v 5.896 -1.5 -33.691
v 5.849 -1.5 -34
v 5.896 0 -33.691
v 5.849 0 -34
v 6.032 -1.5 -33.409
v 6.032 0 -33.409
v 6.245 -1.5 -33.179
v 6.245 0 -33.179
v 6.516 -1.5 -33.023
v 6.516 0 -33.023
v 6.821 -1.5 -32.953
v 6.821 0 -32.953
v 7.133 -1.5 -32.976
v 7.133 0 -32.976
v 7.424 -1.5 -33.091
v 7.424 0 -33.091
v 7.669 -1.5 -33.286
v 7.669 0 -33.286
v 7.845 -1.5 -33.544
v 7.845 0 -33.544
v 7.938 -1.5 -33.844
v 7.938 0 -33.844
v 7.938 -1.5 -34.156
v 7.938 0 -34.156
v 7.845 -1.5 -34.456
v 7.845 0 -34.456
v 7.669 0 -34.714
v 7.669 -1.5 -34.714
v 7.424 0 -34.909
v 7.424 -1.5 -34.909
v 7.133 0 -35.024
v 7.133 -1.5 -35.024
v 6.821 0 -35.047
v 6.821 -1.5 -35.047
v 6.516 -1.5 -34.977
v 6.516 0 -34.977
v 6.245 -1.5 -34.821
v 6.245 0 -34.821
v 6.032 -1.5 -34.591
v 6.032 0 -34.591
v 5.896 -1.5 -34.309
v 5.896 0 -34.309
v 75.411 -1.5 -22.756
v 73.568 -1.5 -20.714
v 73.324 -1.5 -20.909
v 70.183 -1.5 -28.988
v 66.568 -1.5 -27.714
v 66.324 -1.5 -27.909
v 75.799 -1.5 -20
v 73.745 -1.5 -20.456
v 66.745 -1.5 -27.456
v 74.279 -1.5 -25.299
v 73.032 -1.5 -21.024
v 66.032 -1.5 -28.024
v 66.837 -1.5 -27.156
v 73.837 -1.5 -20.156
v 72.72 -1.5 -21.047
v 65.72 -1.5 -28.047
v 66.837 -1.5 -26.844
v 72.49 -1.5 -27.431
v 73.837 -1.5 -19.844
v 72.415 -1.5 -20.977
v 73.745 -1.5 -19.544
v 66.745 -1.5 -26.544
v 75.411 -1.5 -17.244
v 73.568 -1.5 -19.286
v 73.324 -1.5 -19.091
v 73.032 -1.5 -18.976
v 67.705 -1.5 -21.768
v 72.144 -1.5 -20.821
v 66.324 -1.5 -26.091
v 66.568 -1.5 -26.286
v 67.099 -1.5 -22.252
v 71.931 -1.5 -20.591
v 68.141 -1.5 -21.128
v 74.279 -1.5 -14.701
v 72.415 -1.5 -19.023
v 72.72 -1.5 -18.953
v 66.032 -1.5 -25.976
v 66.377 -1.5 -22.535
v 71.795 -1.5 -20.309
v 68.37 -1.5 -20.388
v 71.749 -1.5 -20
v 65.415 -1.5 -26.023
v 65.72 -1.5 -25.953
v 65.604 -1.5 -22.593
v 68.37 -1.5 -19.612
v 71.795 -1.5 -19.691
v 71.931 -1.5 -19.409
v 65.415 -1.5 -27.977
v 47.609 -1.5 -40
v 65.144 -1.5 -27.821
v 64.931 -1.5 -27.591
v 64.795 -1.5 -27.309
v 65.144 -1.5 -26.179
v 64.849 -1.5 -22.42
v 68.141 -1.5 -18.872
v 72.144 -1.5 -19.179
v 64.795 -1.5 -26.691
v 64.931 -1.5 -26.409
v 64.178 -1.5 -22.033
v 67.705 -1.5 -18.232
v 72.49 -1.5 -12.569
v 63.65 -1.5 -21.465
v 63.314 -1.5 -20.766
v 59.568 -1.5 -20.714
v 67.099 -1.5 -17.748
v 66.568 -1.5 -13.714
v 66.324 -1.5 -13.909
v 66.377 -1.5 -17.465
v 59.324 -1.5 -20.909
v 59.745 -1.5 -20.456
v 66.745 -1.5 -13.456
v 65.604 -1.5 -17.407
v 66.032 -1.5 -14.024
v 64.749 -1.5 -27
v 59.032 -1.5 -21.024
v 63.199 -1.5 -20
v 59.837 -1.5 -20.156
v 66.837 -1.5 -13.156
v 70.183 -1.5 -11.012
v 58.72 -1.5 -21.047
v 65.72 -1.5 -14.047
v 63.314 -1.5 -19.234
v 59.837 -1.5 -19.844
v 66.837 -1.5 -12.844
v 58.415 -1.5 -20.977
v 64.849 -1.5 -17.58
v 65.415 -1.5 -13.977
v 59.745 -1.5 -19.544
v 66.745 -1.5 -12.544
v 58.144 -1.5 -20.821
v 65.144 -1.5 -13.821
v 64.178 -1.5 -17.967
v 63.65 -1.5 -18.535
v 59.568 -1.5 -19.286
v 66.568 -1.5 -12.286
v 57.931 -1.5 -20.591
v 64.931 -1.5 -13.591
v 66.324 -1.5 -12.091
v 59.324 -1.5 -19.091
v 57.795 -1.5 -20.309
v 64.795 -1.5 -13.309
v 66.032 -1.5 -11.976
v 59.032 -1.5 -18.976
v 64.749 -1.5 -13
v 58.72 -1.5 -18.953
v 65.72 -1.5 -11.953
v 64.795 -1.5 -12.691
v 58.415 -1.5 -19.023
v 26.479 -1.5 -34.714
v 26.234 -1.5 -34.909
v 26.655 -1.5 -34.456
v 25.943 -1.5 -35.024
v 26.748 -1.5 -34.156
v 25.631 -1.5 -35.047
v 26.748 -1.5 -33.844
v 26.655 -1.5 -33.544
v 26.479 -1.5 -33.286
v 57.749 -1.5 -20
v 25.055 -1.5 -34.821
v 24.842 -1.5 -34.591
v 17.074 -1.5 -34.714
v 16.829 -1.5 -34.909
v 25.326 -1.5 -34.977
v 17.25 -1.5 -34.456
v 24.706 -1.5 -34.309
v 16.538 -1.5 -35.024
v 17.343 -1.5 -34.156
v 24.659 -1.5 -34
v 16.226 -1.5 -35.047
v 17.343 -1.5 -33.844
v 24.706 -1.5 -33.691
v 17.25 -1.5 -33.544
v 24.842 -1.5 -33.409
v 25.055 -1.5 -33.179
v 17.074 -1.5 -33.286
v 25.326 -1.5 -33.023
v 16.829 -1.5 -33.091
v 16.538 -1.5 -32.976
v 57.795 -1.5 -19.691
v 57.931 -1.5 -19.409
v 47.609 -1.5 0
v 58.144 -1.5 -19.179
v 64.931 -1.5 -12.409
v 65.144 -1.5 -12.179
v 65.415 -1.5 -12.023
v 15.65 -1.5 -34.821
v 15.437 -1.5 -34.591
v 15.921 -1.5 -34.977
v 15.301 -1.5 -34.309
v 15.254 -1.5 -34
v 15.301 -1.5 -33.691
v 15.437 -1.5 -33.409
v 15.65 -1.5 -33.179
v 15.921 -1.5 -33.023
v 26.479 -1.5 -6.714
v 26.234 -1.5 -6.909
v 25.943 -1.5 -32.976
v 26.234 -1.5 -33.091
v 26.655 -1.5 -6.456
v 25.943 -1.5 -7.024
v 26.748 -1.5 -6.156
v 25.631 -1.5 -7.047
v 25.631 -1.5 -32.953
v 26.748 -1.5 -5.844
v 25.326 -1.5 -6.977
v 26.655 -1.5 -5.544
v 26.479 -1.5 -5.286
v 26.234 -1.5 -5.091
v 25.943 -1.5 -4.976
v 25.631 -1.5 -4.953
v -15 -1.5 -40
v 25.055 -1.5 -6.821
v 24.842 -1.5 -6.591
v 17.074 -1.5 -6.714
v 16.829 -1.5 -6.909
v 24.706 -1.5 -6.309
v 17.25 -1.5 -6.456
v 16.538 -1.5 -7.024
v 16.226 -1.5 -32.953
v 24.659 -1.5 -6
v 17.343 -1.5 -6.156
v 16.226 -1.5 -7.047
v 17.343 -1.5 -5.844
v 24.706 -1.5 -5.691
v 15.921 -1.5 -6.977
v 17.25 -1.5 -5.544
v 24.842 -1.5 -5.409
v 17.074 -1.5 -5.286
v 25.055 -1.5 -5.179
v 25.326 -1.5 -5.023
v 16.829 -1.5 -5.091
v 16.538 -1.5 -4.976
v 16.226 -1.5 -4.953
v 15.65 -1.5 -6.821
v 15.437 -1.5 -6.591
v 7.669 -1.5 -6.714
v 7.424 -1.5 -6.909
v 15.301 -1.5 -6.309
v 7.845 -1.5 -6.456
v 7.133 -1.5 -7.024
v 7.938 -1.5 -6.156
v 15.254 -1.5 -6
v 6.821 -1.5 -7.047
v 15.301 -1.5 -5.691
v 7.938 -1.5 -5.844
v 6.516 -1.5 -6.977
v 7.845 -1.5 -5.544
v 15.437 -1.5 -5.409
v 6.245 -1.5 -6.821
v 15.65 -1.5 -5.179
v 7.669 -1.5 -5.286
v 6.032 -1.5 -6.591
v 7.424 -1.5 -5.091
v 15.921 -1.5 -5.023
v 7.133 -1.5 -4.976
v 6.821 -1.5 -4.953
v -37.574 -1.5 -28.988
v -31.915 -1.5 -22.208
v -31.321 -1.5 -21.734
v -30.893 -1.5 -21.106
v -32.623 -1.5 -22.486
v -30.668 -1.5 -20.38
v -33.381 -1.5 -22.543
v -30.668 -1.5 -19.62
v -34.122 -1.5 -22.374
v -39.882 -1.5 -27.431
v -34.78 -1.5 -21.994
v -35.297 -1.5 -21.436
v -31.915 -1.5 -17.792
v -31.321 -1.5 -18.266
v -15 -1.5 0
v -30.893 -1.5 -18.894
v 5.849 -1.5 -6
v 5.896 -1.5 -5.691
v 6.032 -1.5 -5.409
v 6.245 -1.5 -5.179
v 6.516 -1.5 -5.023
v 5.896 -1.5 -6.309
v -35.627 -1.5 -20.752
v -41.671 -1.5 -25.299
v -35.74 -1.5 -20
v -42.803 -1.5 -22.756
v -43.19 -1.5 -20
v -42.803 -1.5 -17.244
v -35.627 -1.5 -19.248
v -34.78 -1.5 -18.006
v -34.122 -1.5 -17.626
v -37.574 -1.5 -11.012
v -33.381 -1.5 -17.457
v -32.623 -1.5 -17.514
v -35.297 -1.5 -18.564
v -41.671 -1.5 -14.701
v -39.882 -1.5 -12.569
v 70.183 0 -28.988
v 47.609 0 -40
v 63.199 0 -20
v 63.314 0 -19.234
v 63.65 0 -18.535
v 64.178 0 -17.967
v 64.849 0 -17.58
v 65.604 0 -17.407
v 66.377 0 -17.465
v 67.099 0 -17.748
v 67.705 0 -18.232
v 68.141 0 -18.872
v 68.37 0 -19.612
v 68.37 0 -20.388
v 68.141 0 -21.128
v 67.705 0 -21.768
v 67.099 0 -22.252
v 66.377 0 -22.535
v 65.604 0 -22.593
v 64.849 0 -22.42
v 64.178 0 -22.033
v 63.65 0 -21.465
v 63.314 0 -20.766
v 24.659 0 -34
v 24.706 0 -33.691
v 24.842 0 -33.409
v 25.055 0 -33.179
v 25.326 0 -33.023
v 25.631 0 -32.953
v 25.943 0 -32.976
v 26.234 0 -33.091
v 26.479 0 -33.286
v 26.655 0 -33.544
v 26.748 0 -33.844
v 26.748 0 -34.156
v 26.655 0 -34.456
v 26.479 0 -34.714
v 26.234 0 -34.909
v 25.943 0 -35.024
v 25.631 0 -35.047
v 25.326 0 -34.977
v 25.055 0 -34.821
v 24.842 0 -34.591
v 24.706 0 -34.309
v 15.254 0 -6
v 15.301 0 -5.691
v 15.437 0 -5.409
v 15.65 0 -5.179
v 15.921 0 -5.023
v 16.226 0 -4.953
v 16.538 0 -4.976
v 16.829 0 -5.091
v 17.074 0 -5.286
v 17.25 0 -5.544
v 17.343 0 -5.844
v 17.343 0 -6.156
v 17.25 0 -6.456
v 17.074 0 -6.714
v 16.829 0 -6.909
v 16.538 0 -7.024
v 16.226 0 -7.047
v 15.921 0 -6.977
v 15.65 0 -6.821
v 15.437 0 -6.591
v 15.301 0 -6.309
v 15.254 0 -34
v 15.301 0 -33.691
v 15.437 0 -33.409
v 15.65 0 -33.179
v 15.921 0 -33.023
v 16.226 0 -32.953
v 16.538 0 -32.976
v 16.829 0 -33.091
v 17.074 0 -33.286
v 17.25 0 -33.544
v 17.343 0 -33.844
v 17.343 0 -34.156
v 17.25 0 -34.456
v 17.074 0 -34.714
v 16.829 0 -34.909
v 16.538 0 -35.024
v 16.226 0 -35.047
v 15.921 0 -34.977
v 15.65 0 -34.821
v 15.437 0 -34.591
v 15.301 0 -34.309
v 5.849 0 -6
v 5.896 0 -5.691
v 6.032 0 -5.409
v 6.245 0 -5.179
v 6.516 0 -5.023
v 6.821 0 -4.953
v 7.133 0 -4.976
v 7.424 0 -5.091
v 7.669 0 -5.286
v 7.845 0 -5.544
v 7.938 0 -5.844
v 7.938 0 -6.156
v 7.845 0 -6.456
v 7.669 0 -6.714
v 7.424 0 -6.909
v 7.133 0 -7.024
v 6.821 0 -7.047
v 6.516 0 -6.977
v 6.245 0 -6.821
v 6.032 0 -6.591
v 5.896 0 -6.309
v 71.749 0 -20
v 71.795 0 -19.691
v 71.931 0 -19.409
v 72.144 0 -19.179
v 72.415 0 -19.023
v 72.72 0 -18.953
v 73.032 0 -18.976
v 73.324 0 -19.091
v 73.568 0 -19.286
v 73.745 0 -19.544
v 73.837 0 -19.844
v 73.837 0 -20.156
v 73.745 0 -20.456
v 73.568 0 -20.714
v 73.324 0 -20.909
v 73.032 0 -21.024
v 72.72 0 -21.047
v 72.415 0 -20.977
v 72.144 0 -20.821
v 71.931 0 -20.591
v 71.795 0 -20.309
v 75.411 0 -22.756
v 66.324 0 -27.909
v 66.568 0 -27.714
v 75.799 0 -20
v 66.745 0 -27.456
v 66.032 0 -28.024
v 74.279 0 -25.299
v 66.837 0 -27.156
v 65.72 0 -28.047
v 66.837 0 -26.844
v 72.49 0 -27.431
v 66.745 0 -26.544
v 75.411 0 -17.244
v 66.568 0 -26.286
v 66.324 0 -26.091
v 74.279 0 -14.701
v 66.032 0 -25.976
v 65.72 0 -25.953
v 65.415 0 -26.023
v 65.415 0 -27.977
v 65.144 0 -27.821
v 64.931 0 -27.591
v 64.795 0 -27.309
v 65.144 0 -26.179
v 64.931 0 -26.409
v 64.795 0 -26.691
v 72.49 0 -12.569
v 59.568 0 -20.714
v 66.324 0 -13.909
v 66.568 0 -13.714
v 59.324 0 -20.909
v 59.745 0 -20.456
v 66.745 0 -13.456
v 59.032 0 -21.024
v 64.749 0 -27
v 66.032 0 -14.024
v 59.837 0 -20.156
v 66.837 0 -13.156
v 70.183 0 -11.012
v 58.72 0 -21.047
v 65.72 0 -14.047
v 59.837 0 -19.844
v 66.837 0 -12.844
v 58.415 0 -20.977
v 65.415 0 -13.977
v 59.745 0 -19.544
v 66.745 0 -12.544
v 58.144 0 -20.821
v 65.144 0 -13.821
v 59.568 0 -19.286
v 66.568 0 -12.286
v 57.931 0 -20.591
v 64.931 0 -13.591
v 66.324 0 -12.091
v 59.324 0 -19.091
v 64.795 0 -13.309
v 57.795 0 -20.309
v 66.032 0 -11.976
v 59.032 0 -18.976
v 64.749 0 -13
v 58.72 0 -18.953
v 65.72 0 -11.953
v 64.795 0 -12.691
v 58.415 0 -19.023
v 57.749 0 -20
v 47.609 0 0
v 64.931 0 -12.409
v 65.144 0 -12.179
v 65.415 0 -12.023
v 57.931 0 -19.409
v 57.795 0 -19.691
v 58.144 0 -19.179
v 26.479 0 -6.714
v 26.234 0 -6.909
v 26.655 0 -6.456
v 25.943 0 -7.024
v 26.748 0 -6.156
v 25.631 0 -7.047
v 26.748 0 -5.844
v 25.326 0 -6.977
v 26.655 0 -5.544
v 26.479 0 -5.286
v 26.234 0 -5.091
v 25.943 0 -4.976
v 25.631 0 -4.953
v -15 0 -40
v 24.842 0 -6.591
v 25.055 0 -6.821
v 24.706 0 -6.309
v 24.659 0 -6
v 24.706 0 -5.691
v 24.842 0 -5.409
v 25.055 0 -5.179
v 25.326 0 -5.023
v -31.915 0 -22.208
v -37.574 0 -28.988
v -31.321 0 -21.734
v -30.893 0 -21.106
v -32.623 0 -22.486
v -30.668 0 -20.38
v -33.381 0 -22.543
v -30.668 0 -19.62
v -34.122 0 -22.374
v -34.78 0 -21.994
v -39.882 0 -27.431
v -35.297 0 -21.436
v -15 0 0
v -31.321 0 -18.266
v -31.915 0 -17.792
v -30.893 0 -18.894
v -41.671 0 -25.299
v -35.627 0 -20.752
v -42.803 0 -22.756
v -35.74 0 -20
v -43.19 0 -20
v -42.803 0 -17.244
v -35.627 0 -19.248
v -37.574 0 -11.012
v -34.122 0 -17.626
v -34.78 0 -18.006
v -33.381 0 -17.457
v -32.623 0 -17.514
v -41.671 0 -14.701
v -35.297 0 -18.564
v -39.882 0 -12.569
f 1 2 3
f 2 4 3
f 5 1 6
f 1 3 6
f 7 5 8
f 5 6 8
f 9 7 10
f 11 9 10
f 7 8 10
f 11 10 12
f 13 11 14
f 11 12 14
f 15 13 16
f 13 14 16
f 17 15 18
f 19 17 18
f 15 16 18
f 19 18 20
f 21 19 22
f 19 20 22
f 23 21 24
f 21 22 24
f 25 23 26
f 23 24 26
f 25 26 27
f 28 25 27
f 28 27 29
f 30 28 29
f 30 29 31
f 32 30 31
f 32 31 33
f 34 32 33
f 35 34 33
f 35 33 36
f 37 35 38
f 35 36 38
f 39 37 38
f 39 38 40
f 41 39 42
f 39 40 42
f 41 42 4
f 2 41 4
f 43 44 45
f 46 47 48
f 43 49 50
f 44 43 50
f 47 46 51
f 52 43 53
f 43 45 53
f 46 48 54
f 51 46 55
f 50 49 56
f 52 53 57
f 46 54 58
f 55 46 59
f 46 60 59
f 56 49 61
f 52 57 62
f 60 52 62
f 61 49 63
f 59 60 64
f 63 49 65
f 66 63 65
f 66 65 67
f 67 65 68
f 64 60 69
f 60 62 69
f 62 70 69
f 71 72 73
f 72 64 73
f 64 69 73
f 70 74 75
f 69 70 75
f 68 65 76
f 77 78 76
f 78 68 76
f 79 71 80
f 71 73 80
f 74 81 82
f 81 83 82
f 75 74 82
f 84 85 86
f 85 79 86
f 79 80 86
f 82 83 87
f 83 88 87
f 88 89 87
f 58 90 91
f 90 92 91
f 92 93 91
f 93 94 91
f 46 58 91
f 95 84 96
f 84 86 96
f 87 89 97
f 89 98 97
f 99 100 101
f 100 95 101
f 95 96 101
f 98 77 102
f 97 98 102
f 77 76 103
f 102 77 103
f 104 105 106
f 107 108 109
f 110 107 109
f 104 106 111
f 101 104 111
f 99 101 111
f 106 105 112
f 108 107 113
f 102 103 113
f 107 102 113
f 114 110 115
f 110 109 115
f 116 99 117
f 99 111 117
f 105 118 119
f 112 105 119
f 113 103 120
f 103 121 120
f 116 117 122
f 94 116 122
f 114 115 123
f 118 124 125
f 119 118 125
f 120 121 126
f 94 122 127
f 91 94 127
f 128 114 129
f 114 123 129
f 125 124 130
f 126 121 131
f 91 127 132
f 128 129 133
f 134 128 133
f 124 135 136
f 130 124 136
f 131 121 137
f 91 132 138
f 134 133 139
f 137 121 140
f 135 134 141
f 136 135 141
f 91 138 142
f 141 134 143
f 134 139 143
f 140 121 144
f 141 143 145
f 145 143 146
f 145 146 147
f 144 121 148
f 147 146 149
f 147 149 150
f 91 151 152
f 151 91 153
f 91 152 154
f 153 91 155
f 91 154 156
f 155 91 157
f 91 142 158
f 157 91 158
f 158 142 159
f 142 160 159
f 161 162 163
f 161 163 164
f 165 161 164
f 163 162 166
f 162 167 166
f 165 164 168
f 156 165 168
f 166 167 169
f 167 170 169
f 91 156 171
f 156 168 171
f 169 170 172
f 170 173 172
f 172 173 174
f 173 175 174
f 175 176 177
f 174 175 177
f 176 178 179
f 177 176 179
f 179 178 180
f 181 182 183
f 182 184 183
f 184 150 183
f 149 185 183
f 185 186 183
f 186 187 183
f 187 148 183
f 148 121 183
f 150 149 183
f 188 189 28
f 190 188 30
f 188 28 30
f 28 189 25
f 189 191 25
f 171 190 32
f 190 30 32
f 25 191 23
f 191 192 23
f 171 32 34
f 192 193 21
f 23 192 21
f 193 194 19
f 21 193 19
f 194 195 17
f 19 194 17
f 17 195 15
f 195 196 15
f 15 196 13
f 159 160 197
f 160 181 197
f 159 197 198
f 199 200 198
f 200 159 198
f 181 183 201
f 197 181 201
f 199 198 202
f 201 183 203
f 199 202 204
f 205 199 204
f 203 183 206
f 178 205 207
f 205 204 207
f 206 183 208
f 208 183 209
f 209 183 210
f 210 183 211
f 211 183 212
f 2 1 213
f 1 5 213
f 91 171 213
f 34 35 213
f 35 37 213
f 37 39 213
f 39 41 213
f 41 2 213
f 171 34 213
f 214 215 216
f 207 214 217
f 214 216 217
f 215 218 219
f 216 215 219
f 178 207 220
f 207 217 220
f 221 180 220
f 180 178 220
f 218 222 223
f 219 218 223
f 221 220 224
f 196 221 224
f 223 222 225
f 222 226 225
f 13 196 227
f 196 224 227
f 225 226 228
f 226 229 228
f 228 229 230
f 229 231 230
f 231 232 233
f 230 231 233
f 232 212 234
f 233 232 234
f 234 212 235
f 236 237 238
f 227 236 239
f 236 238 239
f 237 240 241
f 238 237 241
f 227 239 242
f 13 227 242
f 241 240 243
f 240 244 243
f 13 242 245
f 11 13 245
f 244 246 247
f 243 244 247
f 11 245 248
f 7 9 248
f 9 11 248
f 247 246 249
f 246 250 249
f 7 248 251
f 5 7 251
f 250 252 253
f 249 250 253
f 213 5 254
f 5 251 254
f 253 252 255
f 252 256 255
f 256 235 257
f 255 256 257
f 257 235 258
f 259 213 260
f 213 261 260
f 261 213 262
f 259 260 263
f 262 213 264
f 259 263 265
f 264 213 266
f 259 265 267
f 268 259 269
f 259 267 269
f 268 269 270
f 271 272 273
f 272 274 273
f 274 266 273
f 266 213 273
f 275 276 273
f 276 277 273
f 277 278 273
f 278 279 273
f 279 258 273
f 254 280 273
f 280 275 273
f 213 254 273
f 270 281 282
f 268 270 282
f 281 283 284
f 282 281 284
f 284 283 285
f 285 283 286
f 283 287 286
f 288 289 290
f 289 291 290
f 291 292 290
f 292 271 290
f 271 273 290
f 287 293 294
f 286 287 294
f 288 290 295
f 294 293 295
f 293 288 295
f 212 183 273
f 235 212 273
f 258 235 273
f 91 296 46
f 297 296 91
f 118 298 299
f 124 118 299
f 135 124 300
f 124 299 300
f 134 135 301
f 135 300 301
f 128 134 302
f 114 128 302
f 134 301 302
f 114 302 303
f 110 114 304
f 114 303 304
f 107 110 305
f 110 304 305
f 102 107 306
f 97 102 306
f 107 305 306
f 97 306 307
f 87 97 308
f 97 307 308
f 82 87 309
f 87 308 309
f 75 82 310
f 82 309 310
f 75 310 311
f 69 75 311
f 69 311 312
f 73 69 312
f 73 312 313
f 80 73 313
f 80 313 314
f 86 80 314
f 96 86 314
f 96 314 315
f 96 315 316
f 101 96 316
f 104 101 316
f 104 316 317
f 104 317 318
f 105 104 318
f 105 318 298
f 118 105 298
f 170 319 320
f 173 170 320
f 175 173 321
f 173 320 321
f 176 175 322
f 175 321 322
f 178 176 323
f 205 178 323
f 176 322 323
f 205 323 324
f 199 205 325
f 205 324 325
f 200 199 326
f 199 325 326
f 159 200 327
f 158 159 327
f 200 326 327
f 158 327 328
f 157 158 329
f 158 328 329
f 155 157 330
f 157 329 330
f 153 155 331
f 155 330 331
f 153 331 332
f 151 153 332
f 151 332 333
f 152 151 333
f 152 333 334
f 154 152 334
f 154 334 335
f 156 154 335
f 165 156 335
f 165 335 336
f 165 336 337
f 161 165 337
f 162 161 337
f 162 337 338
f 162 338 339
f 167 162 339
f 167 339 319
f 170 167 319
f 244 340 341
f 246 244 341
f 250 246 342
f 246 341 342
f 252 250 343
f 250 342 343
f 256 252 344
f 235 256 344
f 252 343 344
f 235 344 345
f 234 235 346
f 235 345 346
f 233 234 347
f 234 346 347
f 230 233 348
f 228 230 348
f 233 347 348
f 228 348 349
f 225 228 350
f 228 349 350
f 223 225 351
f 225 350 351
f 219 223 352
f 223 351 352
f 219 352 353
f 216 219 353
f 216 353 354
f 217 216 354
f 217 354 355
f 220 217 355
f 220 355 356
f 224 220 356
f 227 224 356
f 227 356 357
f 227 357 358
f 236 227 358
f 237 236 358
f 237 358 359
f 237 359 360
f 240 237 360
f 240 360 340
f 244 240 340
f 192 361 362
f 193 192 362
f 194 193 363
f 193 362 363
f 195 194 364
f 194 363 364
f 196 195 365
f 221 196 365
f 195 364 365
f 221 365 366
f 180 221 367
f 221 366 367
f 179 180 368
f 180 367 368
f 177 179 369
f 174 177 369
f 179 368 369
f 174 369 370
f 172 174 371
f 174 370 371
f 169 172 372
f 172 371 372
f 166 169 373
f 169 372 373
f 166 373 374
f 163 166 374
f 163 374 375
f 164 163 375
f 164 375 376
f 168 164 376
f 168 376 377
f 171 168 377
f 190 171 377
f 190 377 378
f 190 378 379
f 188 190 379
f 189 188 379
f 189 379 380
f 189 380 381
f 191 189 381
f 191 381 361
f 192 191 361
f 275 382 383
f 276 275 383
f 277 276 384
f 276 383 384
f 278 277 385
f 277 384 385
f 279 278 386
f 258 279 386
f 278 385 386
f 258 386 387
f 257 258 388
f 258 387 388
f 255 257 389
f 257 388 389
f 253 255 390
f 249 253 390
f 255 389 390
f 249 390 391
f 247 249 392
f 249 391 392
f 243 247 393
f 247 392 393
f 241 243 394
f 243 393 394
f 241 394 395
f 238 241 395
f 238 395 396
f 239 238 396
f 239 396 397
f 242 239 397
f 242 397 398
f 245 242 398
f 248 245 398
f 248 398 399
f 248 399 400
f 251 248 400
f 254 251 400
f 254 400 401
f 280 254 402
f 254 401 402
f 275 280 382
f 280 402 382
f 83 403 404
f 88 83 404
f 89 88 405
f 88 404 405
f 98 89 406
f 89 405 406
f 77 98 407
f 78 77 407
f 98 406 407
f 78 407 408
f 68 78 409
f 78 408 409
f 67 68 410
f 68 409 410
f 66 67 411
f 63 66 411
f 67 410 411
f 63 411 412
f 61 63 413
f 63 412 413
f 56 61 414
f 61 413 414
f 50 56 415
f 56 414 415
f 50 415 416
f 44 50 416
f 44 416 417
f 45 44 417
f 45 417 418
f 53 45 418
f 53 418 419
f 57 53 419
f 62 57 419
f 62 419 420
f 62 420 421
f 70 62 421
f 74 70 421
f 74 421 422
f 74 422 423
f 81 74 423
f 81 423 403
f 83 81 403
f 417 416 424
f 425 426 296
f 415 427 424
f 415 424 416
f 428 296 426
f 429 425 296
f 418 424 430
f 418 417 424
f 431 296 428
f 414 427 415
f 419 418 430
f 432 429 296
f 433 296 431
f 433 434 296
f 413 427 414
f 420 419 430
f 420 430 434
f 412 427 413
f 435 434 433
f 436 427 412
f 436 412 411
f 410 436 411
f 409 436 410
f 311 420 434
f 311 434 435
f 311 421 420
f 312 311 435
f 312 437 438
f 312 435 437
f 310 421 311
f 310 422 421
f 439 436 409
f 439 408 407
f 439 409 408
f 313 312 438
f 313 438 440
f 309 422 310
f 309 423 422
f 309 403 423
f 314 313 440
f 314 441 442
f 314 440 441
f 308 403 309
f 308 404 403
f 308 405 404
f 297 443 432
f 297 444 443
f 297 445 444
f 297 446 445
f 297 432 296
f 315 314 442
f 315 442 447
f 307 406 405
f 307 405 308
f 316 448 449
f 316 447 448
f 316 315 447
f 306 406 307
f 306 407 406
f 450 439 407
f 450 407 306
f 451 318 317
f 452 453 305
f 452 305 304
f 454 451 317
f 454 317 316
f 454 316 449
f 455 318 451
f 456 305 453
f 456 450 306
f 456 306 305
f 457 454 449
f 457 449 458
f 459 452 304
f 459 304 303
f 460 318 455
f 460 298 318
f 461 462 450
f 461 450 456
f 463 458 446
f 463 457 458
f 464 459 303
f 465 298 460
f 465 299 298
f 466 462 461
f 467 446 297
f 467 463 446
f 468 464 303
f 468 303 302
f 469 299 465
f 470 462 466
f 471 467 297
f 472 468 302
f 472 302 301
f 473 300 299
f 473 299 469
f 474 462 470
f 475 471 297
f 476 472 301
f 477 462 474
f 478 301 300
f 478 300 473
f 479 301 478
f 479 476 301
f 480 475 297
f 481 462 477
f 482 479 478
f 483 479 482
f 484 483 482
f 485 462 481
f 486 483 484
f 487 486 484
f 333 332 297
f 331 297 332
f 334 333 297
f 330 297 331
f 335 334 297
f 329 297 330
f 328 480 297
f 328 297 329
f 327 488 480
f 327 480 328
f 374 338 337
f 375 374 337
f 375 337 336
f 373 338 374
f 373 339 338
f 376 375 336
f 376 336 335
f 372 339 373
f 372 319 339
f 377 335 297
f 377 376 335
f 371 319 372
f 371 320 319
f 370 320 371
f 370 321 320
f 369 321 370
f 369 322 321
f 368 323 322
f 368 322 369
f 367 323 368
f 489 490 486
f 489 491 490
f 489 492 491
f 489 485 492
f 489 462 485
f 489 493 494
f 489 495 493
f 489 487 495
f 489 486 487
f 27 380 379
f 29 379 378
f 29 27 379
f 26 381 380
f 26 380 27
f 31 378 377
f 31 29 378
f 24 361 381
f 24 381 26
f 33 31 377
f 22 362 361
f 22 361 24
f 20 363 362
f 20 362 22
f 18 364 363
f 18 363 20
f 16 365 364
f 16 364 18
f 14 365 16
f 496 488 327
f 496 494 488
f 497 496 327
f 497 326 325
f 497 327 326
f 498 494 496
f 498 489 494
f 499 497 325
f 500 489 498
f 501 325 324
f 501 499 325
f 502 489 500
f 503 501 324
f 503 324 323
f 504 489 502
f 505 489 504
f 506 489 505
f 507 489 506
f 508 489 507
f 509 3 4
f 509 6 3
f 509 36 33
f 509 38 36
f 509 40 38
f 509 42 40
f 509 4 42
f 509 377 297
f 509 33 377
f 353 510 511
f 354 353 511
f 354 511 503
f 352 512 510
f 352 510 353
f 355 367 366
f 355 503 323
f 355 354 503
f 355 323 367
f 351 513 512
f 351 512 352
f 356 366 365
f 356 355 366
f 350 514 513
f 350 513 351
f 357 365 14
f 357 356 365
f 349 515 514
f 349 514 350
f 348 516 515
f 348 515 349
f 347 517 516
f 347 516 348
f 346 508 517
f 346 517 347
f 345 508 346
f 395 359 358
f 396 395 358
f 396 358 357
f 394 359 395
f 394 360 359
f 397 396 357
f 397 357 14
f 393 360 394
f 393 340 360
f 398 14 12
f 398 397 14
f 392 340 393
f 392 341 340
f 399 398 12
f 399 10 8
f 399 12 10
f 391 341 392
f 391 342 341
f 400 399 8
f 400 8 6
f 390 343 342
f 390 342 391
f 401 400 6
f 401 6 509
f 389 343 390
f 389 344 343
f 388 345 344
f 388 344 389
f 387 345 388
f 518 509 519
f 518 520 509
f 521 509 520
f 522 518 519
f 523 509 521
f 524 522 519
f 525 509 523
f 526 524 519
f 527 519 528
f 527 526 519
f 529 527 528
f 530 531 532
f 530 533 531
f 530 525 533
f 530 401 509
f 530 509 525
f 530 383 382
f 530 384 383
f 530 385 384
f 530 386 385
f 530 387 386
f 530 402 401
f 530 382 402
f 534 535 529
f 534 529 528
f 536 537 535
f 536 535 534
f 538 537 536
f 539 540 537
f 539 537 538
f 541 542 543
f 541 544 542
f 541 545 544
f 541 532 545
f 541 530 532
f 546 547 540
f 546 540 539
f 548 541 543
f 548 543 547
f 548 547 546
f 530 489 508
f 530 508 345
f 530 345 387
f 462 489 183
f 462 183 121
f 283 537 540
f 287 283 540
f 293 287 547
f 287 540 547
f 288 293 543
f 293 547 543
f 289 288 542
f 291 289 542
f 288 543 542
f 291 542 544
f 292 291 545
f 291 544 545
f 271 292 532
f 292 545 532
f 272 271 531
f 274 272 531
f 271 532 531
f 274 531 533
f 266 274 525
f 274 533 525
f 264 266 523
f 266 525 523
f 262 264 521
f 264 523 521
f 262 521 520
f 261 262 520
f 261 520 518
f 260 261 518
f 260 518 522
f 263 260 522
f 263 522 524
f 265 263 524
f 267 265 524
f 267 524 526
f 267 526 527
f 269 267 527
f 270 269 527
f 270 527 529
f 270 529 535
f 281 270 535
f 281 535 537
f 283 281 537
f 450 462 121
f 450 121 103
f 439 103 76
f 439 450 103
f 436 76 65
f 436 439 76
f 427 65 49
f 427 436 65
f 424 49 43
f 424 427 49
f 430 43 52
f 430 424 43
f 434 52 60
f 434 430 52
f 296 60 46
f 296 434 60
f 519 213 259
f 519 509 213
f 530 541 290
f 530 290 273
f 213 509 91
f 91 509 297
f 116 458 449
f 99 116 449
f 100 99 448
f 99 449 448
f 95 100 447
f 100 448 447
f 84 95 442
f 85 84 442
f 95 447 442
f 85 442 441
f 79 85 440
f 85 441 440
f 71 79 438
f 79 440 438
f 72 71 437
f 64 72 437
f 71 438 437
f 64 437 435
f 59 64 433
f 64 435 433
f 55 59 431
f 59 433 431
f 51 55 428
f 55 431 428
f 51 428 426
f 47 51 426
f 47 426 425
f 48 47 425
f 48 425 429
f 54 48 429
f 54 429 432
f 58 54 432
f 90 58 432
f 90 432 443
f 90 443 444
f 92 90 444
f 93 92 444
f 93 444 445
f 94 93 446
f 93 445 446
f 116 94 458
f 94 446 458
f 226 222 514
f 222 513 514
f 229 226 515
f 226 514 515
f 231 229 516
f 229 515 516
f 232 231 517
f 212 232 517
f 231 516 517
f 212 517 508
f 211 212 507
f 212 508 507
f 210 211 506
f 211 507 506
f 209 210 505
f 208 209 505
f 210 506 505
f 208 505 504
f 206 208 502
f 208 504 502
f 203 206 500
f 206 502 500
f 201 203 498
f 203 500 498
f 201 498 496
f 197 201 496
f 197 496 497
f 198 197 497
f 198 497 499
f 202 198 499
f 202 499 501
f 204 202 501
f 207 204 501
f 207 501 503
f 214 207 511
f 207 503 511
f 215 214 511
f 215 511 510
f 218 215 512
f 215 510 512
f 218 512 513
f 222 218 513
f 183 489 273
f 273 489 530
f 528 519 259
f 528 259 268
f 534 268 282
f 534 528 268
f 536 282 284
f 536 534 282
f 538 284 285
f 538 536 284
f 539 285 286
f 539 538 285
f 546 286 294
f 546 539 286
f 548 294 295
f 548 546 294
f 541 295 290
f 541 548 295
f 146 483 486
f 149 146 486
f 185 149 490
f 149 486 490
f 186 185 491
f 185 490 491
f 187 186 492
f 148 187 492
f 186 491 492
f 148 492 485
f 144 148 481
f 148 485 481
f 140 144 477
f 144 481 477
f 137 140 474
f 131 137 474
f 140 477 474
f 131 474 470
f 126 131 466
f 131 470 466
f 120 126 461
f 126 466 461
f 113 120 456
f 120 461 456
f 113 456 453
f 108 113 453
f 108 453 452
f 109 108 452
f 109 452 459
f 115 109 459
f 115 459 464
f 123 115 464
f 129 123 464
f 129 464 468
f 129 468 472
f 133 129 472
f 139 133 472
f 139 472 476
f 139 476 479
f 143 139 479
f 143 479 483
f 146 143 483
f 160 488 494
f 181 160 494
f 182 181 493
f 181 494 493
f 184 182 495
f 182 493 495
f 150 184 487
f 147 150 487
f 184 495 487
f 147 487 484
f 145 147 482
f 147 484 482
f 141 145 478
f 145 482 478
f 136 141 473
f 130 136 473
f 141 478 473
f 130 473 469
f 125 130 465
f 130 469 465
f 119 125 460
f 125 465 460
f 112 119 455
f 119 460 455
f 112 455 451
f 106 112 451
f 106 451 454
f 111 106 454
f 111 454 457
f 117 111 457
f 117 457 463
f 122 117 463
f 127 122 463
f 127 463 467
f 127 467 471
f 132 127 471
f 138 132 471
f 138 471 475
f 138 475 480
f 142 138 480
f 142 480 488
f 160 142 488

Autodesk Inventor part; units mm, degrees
ref_plane "YZ Plane" through (0, 0, 0) normal (1, 0, 0) x (0, 1, 0)
ref_plane "XZ Plane" through (0, 0, 0) normal (0, 1, 0) x (-1, 0, 0)
ref_plane "XY Plane" through (0, 0, 0) normal (0, 0, 1) x (1, 0, 0)
sketch "Sketch1" plane through (0, 0, 0) normal (0, 1, 0) x (-1, 0, 0)
  line L0 (-32.1589, 0) -> (-32.1589, -40)
  line L1 (-0.4496, -40) -> (-0.4496, 0)
  circle A0 centre (-72.7986, -20) radius 1.05
  circle A1 centre (-65.7986, -13) radius 1.05
  circle A2 centre (-65.7986, -27) radius 1.05
  circle A3 centre (-58.7986, -20) radius 1.05
  circle A4 centre (-25.7093, -6) radius 1.05
  circle A5 centre (-25.7093, -34) radius 1.05
  circle A6 centre (-16.3043, -6) radius 1.05
  circle A7 centre (-16.3043, -34) radius 1.05
  circle A8 centre (-6.8993, -6) radius 1.05
  circle A9 centre (-6.8993, -34) radius 1.05
  circle A10 centre (-65.7986, -20) radius 2.6
  circle A11 centre (33.19, -20) radius 2.55
  line L2 (37.5744, -11.0124) -> (15, 0)
  arc A12 (37.5744, -28.9876) -> (37.5744, -11.0124) centre (33.19, -20) ccw
  line L3 (15, -40) -> (37.5744, -28.9876)
  line L4 (-47.6086, 0) -> (-70.183, -11.0124)
  arc A13 (-70.183, -11.0124) -> (-70.183, -28.9876) centre (-65.7986, -20) ccw
  line L5 (-70.183, -28.9876) -> (-47.6086, -40)
  line L6 (-47.6086, 0) -> (15, 0)
  line L7 (15, -40) -> (-47.6086, -40)
  line L8 (-32.6086, -40) -> (-32.6086, 0)
  line L9 (-31.7093, 0) -> (-31.7093, -40)
  line L10 (-0.8993, -40) -> (-0.8993, 0)
  line L11 (0, 0) -> (0, -40)
extrude "Extrusion1" add sketch "Sketch1" against normal blind 1.5
properties part number "CAM_axis_6_bottom_frame(top)"
